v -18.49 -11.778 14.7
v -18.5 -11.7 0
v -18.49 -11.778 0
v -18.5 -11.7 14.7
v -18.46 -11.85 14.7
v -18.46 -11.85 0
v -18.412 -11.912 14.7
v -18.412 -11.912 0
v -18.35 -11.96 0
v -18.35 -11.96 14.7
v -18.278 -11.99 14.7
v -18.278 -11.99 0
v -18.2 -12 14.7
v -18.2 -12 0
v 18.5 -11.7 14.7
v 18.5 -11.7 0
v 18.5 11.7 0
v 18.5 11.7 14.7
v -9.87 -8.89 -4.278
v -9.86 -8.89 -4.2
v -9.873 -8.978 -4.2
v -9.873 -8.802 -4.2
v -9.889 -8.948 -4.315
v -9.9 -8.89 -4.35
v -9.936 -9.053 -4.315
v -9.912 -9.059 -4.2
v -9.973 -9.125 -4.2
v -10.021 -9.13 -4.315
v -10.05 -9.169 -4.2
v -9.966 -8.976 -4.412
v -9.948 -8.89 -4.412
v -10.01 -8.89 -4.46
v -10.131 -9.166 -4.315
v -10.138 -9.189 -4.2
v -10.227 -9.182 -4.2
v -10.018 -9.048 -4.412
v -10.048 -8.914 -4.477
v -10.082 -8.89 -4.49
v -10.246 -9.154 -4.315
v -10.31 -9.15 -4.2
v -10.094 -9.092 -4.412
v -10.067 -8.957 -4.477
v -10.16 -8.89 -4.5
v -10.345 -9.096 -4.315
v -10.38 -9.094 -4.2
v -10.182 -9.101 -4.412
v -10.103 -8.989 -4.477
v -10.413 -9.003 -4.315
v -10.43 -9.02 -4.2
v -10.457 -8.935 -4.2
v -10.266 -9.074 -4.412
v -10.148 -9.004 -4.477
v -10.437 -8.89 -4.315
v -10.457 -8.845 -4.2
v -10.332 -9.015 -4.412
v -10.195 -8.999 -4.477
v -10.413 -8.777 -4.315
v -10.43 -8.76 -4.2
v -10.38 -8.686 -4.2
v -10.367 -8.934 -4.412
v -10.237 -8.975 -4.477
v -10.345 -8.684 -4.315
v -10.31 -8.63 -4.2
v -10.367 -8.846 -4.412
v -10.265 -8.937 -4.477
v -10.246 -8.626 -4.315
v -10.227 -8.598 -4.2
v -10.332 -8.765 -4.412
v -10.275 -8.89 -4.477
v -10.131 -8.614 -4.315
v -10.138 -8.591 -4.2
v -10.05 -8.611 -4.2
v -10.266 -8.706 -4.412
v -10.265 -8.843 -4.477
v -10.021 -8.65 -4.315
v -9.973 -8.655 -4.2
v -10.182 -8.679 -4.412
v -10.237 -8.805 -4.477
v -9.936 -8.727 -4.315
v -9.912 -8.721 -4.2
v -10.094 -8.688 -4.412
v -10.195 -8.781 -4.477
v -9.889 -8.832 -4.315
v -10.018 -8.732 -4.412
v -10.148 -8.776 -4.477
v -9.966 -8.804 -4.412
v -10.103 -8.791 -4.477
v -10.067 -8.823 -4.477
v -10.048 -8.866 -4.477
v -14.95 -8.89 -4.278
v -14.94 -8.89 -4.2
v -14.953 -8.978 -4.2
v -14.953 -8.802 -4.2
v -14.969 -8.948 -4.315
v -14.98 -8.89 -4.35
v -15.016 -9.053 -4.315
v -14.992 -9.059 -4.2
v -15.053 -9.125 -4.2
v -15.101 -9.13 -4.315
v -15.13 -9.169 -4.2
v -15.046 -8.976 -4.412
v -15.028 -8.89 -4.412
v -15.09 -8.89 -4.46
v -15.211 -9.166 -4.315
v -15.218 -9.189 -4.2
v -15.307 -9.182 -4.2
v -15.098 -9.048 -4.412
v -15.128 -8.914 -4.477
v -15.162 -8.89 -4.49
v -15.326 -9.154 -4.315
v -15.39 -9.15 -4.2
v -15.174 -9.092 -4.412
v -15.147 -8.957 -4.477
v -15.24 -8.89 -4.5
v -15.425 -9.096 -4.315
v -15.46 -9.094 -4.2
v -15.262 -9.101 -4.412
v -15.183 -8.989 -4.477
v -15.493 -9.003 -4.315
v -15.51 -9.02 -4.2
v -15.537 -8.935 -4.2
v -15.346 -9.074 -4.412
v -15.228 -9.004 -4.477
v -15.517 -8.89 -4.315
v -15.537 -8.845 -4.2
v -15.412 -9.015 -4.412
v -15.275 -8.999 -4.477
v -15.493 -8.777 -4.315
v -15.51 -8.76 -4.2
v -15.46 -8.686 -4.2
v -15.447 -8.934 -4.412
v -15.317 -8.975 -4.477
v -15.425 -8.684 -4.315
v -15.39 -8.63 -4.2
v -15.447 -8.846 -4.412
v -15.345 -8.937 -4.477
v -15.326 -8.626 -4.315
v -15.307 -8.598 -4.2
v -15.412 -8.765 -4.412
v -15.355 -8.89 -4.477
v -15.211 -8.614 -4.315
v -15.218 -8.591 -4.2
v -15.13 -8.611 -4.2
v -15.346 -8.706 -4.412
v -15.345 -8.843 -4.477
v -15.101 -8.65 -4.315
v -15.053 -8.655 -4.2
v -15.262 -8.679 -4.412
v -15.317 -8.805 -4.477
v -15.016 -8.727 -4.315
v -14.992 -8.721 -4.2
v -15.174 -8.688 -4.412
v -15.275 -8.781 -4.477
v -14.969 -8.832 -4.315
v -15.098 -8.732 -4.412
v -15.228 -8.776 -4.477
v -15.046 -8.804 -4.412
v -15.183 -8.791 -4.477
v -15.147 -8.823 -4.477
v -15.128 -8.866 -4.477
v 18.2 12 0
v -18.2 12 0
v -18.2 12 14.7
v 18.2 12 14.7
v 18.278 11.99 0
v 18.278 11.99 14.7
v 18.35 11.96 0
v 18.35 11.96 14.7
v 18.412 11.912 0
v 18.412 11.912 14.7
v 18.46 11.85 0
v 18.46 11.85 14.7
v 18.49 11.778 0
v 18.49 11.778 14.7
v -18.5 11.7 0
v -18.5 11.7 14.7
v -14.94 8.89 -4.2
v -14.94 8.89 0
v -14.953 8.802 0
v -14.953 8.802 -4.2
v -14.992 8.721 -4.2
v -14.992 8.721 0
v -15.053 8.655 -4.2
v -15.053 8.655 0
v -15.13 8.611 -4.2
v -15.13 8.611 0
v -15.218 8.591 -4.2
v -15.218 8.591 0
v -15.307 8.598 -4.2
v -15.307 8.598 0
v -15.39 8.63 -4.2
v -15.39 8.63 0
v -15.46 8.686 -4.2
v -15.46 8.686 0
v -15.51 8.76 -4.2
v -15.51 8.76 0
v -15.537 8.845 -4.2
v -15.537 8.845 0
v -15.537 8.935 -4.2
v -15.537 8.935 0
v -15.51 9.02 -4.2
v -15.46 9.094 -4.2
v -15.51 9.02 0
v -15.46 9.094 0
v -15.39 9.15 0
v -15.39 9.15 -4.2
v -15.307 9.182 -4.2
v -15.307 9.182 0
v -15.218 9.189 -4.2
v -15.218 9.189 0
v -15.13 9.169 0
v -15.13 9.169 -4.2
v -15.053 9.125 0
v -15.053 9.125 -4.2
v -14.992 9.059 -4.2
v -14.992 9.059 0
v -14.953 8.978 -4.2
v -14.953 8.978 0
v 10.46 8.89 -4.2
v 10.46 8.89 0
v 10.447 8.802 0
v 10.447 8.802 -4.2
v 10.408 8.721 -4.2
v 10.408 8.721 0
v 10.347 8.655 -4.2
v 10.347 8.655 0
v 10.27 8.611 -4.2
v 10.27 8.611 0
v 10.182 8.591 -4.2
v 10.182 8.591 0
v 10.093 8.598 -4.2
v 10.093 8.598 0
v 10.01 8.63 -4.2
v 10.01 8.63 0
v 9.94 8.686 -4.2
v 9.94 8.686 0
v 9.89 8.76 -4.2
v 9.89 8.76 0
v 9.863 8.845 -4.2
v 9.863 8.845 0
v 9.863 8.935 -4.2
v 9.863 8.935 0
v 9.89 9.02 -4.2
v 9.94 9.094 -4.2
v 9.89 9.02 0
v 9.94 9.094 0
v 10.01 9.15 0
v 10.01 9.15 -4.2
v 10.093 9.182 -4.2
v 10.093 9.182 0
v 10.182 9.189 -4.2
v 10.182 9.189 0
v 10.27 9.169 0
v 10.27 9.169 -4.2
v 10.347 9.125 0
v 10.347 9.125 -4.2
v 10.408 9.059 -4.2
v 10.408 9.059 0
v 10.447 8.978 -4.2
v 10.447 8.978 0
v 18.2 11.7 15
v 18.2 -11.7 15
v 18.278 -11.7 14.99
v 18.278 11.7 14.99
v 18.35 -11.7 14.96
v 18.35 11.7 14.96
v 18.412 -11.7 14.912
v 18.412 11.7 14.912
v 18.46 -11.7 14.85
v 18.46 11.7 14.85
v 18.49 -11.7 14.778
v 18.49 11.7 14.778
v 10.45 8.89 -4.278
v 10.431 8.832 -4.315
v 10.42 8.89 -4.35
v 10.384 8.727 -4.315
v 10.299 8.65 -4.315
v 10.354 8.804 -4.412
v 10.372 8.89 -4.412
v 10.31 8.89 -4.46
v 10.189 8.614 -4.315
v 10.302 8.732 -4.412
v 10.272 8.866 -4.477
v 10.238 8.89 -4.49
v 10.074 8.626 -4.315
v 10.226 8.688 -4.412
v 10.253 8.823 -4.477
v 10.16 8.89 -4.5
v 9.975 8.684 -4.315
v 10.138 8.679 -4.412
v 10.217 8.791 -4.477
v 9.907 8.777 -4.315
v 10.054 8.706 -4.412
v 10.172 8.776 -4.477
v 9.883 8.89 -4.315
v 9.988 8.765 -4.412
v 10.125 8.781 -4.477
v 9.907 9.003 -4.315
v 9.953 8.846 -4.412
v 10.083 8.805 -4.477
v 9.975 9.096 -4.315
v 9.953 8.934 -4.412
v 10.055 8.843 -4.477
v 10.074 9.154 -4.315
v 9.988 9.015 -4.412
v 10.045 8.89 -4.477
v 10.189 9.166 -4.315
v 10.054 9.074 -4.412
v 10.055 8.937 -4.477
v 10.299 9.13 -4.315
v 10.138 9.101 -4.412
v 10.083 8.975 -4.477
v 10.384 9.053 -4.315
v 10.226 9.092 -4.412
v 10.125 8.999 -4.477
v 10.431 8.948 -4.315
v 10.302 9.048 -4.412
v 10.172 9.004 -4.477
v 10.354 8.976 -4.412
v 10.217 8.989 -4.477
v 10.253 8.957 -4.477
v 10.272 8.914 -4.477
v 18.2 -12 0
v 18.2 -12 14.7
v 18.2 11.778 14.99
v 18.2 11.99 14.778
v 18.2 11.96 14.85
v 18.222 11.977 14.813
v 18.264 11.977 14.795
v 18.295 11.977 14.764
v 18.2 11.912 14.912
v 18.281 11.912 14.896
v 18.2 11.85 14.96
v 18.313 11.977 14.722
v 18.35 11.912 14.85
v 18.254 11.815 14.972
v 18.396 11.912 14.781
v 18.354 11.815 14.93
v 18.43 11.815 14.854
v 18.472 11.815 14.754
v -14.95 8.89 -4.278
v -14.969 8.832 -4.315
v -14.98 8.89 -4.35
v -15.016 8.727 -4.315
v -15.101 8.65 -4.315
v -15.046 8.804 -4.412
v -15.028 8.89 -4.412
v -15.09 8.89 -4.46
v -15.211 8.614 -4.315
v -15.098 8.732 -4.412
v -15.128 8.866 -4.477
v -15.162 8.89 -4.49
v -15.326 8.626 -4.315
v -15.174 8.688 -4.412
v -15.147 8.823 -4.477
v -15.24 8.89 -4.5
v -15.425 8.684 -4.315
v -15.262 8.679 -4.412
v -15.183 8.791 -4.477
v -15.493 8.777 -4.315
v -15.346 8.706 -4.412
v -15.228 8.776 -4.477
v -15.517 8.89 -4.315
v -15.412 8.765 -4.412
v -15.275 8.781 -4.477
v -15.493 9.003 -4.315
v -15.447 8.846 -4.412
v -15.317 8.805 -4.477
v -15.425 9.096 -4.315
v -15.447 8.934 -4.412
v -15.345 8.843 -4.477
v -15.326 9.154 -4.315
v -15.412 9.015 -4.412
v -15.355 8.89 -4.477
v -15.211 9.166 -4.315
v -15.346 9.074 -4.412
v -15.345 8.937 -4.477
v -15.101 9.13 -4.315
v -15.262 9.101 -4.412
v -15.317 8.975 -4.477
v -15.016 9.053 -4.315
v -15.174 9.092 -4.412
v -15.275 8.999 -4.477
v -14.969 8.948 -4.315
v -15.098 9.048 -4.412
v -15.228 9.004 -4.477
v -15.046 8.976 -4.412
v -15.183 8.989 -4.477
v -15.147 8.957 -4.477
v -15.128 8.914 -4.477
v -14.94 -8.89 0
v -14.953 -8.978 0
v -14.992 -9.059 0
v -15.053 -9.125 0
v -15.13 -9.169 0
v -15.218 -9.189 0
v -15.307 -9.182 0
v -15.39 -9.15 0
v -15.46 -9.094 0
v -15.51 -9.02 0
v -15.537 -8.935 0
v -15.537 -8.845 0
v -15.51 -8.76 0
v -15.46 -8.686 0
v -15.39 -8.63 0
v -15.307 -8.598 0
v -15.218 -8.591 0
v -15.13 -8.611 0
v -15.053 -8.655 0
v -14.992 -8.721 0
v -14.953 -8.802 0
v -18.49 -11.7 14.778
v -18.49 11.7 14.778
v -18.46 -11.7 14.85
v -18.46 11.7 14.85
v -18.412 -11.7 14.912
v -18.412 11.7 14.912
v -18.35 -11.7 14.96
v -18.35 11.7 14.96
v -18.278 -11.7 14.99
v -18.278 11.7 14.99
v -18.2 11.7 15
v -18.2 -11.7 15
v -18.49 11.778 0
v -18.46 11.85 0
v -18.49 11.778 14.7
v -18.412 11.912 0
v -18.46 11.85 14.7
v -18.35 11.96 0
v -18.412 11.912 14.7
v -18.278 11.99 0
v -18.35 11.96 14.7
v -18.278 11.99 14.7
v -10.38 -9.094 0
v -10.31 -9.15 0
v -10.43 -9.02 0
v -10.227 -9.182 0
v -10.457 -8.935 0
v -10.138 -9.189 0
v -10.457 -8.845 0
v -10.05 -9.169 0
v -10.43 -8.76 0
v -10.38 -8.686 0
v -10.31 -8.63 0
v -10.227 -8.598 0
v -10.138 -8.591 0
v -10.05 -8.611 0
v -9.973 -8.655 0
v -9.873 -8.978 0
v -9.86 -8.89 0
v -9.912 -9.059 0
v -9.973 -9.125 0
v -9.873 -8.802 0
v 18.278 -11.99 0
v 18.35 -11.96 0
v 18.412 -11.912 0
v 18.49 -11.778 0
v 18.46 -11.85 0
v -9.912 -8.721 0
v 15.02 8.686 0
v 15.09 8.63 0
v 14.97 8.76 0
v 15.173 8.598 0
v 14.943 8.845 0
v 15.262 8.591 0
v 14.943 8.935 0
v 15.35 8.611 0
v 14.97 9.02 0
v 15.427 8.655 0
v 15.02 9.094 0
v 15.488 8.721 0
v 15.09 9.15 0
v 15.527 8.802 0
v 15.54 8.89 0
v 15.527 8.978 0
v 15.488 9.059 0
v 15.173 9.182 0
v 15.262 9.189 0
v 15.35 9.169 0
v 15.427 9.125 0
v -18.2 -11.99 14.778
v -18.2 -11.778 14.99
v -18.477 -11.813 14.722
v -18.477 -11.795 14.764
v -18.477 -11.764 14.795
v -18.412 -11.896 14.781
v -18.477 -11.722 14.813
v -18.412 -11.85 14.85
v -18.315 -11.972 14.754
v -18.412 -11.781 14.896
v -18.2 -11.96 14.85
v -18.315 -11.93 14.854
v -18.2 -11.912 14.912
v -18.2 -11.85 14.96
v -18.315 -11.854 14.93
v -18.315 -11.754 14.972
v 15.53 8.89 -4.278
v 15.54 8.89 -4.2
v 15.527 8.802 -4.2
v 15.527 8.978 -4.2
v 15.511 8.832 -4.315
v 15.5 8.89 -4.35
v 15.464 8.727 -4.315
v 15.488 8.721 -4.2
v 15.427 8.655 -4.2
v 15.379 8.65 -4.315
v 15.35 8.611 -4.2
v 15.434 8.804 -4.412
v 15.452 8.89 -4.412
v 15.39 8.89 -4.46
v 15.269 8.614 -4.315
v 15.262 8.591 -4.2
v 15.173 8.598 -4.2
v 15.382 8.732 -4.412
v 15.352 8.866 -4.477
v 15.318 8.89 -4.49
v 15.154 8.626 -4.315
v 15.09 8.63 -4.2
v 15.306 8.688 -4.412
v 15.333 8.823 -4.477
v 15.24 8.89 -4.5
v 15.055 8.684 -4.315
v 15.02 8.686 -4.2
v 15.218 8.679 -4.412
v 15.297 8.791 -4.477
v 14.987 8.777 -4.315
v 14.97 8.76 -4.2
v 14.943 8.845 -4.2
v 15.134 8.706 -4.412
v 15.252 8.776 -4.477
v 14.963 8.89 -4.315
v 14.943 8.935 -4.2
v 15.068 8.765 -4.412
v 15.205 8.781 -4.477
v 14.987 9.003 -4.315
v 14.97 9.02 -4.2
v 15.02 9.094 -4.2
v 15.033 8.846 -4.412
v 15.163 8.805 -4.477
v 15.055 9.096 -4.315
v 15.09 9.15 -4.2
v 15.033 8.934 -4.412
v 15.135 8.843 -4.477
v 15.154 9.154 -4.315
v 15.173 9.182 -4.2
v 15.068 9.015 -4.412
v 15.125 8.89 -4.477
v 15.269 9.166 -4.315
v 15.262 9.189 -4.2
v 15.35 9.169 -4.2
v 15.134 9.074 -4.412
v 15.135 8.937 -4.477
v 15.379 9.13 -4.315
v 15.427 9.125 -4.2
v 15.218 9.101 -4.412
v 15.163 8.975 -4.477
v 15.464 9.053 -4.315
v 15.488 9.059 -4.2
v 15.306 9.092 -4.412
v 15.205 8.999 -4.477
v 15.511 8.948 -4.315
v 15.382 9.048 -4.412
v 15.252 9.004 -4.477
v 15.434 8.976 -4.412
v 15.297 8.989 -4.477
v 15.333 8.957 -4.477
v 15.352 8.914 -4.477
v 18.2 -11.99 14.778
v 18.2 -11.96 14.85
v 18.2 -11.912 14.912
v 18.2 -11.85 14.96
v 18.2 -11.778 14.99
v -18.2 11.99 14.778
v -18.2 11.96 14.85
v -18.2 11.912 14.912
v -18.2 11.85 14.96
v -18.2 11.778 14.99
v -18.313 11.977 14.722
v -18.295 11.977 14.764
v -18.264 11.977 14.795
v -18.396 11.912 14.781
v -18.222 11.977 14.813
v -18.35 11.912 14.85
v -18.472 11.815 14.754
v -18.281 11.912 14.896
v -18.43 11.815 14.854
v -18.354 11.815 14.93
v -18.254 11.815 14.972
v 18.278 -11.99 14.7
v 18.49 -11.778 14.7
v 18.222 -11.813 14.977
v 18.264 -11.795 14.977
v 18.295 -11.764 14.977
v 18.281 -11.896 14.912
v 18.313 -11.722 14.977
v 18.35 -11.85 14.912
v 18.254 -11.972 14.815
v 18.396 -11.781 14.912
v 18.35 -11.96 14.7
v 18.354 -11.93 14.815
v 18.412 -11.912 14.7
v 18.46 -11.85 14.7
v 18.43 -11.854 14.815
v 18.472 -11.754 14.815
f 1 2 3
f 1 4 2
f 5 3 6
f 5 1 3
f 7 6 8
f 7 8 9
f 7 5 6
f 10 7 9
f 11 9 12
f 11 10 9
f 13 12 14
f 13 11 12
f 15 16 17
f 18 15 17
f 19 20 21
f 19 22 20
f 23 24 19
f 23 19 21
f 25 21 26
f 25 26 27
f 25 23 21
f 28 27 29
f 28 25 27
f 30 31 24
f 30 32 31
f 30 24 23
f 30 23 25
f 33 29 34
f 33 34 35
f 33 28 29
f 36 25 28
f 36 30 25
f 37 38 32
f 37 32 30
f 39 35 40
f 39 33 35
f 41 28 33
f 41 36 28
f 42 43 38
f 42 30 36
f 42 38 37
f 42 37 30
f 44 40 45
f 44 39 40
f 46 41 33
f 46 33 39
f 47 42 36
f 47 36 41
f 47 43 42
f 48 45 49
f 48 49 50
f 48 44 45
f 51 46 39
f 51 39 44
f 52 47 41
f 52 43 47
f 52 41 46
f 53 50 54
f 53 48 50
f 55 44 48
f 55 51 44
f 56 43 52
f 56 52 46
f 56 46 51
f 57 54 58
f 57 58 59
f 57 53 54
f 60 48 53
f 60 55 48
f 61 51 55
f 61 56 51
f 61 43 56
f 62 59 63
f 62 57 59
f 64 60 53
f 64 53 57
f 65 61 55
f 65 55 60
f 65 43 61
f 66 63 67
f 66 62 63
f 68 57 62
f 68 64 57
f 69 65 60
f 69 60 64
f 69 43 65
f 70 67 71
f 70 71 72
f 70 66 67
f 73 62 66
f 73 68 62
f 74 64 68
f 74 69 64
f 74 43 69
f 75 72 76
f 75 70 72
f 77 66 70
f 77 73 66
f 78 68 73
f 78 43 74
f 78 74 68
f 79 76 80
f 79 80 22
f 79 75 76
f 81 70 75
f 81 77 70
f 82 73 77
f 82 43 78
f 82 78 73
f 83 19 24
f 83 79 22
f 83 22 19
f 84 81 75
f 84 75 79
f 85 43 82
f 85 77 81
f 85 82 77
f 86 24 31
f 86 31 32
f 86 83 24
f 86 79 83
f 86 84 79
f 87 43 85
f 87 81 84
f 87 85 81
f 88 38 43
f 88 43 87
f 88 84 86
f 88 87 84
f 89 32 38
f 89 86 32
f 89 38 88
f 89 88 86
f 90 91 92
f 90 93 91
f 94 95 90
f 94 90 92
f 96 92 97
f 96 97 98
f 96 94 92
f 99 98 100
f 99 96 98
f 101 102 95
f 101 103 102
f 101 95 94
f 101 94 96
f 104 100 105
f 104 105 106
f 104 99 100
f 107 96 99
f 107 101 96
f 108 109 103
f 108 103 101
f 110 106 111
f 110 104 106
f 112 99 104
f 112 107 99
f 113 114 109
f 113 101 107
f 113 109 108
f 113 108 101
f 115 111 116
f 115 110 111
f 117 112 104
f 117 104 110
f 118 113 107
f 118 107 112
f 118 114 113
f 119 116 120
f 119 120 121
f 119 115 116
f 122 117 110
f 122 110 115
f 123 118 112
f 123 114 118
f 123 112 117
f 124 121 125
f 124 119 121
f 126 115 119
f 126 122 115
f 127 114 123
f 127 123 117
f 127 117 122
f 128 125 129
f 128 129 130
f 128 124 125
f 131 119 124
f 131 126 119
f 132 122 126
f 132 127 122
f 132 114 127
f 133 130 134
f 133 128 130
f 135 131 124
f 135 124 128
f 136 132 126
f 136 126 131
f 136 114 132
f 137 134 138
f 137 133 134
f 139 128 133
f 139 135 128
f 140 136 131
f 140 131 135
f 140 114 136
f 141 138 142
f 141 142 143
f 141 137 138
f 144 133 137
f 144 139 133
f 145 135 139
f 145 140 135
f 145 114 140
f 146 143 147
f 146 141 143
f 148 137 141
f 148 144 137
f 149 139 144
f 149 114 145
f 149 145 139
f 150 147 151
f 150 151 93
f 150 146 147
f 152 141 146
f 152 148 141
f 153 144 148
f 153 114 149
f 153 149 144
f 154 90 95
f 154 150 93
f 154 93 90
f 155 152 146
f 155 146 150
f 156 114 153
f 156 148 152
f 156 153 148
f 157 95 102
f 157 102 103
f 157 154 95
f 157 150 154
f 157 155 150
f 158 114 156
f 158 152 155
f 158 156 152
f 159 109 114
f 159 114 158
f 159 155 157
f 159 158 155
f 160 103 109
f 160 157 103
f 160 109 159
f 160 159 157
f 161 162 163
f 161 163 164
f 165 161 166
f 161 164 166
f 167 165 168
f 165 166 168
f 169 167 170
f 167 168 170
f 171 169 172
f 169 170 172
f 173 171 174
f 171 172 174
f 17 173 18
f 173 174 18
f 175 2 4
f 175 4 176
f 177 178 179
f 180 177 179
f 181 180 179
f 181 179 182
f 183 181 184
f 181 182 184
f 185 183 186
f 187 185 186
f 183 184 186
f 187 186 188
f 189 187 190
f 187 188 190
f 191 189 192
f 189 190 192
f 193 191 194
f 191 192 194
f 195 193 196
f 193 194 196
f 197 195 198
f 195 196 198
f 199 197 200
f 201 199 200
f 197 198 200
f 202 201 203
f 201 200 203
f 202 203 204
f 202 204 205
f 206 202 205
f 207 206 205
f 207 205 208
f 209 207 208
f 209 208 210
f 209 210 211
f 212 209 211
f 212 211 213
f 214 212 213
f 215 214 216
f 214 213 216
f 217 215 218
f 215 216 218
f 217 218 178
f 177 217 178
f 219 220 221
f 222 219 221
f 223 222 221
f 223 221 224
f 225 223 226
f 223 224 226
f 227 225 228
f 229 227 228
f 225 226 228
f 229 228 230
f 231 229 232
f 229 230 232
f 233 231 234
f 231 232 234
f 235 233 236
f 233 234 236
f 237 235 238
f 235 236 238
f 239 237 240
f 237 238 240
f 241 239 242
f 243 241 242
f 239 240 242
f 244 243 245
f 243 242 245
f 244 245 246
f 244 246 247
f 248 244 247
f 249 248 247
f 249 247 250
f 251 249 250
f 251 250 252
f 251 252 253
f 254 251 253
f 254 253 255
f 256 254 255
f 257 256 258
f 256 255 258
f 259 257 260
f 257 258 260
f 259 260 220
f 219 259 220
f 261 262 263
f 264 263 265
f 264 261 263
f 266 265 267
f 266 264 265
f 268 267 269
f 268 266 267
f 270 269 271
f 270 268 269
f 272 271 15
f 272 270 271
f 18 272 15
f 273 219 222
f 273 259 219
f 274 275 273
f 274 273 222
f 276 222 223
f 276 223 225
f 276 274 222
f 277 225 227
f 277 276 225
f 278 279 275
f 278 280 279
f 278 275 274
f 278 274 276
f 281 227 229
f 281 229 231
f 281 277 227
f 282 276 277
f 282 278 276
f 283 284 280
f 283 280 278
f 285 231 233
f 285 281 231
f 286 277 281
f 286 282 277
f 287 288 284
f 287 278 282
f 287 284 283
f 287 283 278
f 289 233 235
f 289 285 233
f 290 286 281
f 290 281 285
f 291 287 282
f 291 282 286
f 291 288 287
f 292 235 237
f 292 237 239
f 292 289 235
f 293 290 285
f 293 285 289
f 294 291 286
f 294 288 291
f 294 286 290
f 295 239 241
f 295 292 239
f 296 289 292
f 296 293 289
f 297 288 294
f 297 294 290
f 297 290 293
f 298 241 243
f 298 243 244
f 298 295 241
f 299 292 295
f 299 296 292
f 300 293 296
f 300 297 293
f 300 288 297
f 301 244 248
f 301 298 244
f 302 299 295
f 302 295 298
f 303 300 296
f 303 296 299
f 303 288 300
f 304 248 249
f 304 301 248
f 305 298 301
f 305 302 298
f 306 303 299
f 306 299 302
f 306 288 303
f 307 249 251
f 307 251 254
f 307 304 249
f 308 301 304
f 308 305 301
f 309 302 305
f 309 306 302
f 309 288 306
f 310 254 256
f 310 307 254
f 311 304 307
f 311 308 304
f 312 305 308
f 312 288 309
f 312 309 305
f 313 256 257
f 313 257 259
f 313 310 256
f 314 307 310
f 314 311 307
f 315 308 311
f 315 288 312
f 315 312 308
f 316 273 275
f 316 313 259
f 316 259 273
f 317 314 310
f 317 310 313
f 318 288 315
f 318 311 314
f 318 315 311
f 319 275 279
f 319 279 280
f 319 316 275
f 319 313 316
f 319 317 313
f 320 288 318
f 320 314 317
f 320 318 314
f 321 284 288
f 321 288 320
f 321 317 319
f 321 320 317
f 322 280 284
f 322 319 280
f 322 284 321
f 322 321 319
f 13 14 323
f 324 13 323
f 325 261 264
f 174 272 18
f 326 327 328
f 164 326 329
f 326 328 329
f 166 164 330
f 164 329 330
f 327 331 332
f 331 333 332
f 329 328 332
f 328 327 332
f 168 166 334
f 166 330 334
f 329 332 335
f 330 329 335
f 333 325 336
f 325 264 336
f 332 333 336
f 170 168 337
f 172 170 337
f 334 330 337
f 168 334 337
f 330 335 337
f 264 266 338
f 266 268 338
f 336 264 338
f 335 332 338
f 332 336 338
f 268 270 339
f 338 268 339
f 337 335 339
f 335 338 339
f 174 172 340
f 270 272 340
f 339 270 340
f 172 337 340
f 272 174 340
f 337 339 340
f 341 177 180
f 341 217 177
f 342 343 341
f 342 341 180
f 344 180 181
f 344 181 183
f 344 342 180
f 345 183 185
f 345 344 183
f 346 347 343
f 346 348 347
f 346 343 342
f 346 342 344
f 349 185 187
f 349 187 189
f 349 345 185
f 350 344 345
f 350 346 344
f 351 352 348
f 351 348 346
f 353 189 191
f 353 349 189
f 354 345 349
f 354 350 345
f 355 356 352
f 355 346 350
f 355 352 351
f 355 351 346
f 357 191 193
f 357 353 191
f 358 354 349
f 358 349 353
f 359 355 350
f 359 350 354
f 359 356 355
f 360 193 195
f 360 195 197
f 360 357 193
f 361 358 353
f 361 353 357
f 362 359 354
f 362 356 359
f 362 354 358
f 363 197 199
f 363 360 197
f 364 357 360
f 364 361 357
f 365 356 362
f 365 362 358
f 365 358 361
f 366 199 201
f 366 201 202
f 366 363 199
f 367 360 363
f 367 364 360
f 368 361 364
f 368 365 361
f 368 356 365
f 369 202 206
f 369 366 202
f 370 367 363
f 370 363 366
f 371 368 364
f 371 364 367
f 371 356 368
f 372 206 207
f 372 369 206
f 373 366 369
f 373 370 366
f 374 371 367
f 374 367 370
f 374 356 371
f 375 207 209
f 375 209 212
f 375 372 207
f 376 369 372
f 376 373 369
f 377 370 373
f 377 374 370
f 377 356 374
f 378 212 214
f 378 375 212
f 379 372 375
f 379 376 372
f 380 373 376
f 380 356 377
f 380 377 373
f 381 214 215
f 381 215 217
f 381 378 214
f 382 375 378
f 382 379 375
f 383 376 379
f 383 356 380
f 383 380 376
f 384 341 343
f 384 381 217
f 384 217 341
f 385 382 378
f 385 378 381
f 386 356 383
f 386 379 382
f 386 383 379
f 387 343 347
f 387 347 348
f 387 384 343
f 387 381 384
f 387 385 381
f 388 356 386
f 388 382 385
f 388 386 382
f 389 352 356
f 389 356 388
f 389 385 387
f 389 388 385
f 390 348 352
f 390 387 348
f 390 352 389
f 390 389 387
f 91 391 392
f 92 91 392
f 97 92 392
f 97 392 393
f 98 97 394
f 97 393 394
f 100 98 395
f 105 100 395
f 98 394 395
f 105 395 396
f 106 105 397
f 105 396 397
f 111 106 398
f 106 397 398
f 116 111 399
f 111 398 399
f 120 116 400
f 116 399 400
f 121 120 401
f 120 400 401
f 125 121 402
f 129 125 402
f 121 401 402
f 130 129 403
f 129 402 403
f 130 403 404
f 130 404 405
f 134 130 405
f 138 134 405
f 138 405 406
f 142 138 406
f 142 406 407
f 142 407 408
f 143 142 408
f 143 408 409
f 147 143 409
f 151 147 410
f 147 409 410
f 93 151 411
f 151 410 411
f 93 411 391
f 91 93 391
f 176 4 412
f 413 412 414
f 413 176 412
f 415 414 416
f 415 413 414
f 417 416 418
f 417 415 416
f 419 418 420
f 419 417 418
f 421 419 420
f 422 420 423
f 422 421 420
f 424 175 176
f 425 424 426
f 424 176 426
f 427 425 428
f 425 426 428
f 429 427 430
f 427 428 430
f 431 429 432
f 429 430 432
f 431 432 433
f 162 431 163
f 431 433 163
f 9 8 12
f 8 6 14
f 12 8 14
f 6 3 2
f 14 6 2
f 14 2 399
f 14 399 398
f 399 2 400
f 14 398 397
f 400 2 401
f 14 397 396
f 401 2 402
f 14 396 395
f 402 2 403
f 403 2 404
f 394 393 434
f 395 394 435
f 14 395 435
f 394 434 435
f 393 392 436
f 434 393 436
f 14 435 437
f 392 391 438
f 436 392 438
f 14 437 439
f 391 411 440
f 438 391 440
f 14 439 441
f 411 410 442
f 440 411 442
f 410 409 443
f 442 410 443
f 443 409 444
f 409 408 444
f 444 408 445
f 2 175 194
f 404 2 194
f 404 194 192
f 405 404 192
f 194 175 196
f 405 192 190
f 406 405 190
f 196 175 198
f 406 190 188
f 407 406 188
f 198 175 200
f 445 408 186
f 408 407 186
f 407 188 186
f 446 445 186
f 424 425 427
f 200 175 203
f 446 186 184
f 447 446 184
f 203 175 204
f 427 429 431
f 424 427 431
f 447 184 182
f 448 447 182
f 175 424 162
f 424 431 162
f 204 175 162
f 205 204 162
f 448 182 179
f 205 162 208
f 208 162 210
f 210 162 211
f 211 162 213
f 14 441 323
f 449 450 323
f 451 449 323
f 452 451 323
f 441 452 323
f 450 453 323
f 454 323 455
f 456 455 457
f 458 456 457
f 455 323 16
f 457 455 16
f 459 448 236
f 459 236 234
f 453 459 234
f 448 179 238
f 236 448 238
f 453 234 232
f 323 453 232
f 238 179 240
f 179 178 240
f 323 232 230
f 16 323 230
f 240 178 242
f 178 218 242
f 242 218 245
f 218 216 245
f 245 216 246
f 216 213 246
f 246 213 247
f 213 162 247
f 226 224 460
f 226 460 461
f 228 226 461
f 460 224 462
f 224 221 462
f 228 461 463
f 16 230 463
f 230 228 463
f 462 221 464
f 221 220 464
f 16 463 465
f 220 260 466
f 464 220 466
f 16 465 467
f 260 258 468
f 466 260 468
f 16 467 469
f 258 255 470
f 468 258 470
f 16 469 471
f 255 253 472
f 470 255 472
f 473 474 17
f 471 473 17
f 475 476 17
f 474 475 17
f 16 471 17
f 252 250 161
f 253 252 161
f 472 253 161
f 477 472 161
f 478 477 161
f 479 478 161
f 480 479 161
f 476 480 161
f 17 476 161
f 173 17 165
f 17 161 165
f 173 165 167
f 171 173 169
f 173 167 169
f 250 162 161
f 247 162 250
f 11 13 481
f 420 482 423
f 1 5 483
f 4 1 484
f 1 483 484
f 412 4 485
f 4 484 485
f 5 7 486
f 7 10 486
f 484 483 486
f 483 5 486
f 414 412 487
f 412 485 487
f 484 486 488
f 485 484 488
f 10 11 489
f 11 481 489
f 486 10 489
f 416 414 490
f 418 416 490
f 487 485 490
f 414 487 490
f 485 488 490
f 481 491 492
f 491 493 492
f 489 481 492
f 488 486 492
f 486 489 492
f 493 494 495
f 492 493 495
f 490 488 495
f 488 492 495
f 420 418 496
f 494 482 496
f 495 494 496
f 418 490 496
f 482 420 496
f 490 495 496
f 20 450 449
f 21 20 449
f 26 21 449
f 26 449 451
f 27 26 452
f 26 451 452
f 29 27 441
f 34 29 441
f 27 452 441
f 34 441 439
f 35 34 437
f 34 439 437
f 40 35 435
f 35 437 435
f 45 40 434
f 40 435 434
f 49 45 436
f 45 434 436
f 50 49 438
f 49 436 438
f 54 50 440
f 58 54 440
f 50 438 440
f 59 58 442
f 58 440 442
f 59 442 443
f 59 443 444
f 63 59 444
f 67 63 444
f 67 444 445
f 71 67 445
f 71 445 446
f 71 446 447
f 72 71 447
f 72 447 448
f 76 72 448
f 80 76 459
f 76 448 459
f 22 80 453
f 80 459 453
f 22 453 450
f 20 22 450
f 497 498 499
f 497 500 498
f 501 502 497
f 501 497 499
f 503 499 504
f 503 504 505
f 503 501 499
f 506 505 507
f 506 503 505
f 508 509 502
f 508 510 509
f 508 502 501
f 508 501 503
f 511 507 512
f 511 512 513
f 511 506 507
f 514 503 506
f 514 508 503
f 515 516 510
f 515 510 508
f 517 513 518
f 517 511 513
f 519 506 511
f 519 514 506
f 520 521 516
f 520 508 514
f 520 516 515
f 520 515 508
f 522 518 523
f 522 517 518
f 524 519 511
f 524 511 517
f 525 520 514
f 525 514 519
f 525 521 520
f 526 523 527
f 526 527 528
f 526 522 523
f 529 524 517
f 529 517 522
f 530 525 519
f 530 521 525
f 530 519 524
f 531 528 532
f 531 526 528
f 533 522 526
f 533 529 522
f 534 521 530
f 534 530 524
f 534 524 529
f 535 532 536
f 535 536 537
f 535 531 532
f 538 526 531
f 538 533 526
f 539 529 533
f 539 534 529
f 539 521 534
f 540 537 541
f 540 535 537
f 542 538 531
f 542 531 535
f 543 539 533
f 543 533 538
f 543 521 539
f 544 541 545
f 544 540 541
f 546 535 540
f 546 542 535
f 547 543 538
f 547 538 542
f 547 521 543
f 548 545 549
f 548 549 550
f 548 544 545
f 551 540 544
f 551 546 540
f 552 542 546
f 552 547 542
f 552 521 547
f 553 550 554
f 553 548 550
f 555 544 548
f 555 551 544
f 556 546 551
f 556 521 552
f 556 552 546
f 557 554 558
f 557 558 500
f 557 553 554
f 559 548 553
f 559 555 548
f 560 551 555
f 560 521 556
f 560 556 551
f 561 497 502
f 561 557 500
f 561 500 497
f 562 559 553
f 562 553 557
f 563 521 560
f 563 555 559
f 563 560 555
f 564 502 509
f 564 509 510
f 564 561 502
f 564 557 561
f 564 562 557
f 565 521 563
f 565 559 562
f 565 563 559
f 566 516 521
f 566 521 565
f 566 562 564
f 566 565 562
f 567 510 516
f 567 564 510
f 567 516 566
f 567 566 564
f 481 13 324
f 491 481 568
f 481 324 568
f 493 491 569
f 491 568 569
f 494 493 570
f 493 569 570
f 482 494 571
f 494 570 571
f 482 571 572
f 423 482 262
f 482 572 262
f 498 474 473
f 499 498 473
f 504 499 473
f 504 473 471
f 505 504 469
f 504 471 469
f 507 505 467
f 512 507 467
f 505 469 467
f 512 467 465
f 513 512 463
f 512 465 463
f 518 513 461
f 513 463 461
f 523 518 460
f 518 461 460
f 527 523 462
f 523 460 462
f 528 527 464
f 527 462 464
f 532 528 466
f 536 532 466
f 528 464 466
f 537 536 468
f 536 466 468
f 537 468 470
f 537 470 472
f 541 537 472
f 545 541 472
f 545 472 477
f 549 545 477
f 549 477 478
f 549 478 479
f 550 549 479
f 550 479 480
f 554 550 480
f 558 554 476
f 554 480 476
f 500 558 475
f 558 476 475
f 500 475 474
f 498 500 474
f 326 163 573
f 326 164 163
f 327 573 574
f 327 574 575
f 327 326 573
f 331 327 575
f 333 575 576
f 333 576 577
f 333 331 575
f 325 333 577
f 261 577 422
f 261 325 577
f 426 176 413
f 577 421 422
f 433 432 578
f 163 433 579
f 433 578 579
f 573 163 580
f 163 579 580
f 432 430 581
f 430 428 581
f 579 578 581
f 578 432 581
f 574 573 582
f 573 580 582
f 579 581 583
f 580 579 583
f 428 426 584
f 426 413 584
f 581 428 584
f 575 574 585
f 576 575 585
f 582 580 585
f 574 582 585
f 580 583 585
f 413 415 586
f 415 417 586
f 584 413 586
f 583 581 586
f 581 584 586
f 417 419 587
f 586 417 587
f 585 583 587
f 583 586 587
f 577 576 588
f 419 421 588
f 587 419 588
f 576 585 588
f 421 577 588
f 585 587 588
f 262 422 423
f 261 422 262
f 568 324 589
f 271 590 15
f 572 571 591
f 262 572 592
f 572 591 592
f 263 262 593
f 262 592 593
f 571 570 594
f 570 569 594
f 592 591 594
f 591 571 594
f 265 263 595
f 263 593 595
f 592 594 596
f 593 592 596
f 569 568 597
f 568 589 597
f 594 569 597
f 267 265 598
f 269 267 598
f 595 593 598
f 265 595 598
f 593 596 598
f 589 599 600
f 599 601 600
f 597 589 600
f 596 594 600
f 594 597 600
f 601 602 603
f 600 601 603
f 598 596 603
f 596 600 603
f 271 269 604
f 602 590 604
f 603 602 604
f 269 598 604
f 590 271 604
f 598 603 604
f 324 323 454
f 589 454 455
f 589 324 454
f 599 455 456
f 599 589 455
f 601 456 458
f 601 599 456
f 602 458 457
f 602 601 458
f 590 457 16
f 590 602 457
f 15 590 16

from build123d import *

# Parameters (mm, degrees)
SKETCH_W     = 37
SKETCH_H     = 24
PAD_DEPTH    = 15
SKETCH002_R  = 0.3
PAD001_DEPTH = 4.5
FILLET_R     = 0.3
FILLET001_R  = 0.3


with BuildPart() as part:
    # Sketch → Pad (new body)
    with BuildSketch(Plane.XY):
        Rectangle(SKETCH_W, SKETCH_H)
    extrude(amount=PAD_DEPTH)

    # Sketch002 (on Face5 of Pad) → Pad001 (join)
    with BuildSketch(Plane(origin=(0, 0, 0), x_dir=(1, 0, 0), z_dir=(0, 0, -1))):
        with Locations((-15.24, 8.89)):
            Circle(SKETCH002_R)
        with Locations((-10.16, 8.89)):
            Circle(SKETCH002_R)
        with Locations((10.16, -8.89)):
            Circle(SKETCH002_R)
        with Locations((15.24, -8.89)):
            Circle(SKETCH002_R)
        with Locations((-15.24, -8.89)):
            Circle(SKETCH002_R)
    extrude(amount=PAD001_DEPTH)

    # Fillet
    fillet_edges = [part.edges().sort_by_distance(p)[0] for p in [
        (18.5, -12, 7.5),
        (0, -12, 15),
        (-18.5, -12, 7.5),
        (-18.5, 0, 15),
        (-18.5, 12, 7.5),
        (18.5, 0, 15),
        (0, 12, 15),
        (18.5, 12, 7.5),
    ]]
    fillet(fillet_edges, radius=FILLET_R)

    # Fillet001
    fillet001_edges = [part.edges().sort_by_distance(p)[0] for p in [
        (14.94, 8.89, -4.5),
        (9.86, 8.89, -4.5),
        (-15.54, 8.89, -4.5),
        (-15.54, -8.89, -4.5),
        (-10.46, -8.89, -4.5),
    ]]
    fillet(fillet001_edges, radius=FILLET001_R)


solid = part.part
